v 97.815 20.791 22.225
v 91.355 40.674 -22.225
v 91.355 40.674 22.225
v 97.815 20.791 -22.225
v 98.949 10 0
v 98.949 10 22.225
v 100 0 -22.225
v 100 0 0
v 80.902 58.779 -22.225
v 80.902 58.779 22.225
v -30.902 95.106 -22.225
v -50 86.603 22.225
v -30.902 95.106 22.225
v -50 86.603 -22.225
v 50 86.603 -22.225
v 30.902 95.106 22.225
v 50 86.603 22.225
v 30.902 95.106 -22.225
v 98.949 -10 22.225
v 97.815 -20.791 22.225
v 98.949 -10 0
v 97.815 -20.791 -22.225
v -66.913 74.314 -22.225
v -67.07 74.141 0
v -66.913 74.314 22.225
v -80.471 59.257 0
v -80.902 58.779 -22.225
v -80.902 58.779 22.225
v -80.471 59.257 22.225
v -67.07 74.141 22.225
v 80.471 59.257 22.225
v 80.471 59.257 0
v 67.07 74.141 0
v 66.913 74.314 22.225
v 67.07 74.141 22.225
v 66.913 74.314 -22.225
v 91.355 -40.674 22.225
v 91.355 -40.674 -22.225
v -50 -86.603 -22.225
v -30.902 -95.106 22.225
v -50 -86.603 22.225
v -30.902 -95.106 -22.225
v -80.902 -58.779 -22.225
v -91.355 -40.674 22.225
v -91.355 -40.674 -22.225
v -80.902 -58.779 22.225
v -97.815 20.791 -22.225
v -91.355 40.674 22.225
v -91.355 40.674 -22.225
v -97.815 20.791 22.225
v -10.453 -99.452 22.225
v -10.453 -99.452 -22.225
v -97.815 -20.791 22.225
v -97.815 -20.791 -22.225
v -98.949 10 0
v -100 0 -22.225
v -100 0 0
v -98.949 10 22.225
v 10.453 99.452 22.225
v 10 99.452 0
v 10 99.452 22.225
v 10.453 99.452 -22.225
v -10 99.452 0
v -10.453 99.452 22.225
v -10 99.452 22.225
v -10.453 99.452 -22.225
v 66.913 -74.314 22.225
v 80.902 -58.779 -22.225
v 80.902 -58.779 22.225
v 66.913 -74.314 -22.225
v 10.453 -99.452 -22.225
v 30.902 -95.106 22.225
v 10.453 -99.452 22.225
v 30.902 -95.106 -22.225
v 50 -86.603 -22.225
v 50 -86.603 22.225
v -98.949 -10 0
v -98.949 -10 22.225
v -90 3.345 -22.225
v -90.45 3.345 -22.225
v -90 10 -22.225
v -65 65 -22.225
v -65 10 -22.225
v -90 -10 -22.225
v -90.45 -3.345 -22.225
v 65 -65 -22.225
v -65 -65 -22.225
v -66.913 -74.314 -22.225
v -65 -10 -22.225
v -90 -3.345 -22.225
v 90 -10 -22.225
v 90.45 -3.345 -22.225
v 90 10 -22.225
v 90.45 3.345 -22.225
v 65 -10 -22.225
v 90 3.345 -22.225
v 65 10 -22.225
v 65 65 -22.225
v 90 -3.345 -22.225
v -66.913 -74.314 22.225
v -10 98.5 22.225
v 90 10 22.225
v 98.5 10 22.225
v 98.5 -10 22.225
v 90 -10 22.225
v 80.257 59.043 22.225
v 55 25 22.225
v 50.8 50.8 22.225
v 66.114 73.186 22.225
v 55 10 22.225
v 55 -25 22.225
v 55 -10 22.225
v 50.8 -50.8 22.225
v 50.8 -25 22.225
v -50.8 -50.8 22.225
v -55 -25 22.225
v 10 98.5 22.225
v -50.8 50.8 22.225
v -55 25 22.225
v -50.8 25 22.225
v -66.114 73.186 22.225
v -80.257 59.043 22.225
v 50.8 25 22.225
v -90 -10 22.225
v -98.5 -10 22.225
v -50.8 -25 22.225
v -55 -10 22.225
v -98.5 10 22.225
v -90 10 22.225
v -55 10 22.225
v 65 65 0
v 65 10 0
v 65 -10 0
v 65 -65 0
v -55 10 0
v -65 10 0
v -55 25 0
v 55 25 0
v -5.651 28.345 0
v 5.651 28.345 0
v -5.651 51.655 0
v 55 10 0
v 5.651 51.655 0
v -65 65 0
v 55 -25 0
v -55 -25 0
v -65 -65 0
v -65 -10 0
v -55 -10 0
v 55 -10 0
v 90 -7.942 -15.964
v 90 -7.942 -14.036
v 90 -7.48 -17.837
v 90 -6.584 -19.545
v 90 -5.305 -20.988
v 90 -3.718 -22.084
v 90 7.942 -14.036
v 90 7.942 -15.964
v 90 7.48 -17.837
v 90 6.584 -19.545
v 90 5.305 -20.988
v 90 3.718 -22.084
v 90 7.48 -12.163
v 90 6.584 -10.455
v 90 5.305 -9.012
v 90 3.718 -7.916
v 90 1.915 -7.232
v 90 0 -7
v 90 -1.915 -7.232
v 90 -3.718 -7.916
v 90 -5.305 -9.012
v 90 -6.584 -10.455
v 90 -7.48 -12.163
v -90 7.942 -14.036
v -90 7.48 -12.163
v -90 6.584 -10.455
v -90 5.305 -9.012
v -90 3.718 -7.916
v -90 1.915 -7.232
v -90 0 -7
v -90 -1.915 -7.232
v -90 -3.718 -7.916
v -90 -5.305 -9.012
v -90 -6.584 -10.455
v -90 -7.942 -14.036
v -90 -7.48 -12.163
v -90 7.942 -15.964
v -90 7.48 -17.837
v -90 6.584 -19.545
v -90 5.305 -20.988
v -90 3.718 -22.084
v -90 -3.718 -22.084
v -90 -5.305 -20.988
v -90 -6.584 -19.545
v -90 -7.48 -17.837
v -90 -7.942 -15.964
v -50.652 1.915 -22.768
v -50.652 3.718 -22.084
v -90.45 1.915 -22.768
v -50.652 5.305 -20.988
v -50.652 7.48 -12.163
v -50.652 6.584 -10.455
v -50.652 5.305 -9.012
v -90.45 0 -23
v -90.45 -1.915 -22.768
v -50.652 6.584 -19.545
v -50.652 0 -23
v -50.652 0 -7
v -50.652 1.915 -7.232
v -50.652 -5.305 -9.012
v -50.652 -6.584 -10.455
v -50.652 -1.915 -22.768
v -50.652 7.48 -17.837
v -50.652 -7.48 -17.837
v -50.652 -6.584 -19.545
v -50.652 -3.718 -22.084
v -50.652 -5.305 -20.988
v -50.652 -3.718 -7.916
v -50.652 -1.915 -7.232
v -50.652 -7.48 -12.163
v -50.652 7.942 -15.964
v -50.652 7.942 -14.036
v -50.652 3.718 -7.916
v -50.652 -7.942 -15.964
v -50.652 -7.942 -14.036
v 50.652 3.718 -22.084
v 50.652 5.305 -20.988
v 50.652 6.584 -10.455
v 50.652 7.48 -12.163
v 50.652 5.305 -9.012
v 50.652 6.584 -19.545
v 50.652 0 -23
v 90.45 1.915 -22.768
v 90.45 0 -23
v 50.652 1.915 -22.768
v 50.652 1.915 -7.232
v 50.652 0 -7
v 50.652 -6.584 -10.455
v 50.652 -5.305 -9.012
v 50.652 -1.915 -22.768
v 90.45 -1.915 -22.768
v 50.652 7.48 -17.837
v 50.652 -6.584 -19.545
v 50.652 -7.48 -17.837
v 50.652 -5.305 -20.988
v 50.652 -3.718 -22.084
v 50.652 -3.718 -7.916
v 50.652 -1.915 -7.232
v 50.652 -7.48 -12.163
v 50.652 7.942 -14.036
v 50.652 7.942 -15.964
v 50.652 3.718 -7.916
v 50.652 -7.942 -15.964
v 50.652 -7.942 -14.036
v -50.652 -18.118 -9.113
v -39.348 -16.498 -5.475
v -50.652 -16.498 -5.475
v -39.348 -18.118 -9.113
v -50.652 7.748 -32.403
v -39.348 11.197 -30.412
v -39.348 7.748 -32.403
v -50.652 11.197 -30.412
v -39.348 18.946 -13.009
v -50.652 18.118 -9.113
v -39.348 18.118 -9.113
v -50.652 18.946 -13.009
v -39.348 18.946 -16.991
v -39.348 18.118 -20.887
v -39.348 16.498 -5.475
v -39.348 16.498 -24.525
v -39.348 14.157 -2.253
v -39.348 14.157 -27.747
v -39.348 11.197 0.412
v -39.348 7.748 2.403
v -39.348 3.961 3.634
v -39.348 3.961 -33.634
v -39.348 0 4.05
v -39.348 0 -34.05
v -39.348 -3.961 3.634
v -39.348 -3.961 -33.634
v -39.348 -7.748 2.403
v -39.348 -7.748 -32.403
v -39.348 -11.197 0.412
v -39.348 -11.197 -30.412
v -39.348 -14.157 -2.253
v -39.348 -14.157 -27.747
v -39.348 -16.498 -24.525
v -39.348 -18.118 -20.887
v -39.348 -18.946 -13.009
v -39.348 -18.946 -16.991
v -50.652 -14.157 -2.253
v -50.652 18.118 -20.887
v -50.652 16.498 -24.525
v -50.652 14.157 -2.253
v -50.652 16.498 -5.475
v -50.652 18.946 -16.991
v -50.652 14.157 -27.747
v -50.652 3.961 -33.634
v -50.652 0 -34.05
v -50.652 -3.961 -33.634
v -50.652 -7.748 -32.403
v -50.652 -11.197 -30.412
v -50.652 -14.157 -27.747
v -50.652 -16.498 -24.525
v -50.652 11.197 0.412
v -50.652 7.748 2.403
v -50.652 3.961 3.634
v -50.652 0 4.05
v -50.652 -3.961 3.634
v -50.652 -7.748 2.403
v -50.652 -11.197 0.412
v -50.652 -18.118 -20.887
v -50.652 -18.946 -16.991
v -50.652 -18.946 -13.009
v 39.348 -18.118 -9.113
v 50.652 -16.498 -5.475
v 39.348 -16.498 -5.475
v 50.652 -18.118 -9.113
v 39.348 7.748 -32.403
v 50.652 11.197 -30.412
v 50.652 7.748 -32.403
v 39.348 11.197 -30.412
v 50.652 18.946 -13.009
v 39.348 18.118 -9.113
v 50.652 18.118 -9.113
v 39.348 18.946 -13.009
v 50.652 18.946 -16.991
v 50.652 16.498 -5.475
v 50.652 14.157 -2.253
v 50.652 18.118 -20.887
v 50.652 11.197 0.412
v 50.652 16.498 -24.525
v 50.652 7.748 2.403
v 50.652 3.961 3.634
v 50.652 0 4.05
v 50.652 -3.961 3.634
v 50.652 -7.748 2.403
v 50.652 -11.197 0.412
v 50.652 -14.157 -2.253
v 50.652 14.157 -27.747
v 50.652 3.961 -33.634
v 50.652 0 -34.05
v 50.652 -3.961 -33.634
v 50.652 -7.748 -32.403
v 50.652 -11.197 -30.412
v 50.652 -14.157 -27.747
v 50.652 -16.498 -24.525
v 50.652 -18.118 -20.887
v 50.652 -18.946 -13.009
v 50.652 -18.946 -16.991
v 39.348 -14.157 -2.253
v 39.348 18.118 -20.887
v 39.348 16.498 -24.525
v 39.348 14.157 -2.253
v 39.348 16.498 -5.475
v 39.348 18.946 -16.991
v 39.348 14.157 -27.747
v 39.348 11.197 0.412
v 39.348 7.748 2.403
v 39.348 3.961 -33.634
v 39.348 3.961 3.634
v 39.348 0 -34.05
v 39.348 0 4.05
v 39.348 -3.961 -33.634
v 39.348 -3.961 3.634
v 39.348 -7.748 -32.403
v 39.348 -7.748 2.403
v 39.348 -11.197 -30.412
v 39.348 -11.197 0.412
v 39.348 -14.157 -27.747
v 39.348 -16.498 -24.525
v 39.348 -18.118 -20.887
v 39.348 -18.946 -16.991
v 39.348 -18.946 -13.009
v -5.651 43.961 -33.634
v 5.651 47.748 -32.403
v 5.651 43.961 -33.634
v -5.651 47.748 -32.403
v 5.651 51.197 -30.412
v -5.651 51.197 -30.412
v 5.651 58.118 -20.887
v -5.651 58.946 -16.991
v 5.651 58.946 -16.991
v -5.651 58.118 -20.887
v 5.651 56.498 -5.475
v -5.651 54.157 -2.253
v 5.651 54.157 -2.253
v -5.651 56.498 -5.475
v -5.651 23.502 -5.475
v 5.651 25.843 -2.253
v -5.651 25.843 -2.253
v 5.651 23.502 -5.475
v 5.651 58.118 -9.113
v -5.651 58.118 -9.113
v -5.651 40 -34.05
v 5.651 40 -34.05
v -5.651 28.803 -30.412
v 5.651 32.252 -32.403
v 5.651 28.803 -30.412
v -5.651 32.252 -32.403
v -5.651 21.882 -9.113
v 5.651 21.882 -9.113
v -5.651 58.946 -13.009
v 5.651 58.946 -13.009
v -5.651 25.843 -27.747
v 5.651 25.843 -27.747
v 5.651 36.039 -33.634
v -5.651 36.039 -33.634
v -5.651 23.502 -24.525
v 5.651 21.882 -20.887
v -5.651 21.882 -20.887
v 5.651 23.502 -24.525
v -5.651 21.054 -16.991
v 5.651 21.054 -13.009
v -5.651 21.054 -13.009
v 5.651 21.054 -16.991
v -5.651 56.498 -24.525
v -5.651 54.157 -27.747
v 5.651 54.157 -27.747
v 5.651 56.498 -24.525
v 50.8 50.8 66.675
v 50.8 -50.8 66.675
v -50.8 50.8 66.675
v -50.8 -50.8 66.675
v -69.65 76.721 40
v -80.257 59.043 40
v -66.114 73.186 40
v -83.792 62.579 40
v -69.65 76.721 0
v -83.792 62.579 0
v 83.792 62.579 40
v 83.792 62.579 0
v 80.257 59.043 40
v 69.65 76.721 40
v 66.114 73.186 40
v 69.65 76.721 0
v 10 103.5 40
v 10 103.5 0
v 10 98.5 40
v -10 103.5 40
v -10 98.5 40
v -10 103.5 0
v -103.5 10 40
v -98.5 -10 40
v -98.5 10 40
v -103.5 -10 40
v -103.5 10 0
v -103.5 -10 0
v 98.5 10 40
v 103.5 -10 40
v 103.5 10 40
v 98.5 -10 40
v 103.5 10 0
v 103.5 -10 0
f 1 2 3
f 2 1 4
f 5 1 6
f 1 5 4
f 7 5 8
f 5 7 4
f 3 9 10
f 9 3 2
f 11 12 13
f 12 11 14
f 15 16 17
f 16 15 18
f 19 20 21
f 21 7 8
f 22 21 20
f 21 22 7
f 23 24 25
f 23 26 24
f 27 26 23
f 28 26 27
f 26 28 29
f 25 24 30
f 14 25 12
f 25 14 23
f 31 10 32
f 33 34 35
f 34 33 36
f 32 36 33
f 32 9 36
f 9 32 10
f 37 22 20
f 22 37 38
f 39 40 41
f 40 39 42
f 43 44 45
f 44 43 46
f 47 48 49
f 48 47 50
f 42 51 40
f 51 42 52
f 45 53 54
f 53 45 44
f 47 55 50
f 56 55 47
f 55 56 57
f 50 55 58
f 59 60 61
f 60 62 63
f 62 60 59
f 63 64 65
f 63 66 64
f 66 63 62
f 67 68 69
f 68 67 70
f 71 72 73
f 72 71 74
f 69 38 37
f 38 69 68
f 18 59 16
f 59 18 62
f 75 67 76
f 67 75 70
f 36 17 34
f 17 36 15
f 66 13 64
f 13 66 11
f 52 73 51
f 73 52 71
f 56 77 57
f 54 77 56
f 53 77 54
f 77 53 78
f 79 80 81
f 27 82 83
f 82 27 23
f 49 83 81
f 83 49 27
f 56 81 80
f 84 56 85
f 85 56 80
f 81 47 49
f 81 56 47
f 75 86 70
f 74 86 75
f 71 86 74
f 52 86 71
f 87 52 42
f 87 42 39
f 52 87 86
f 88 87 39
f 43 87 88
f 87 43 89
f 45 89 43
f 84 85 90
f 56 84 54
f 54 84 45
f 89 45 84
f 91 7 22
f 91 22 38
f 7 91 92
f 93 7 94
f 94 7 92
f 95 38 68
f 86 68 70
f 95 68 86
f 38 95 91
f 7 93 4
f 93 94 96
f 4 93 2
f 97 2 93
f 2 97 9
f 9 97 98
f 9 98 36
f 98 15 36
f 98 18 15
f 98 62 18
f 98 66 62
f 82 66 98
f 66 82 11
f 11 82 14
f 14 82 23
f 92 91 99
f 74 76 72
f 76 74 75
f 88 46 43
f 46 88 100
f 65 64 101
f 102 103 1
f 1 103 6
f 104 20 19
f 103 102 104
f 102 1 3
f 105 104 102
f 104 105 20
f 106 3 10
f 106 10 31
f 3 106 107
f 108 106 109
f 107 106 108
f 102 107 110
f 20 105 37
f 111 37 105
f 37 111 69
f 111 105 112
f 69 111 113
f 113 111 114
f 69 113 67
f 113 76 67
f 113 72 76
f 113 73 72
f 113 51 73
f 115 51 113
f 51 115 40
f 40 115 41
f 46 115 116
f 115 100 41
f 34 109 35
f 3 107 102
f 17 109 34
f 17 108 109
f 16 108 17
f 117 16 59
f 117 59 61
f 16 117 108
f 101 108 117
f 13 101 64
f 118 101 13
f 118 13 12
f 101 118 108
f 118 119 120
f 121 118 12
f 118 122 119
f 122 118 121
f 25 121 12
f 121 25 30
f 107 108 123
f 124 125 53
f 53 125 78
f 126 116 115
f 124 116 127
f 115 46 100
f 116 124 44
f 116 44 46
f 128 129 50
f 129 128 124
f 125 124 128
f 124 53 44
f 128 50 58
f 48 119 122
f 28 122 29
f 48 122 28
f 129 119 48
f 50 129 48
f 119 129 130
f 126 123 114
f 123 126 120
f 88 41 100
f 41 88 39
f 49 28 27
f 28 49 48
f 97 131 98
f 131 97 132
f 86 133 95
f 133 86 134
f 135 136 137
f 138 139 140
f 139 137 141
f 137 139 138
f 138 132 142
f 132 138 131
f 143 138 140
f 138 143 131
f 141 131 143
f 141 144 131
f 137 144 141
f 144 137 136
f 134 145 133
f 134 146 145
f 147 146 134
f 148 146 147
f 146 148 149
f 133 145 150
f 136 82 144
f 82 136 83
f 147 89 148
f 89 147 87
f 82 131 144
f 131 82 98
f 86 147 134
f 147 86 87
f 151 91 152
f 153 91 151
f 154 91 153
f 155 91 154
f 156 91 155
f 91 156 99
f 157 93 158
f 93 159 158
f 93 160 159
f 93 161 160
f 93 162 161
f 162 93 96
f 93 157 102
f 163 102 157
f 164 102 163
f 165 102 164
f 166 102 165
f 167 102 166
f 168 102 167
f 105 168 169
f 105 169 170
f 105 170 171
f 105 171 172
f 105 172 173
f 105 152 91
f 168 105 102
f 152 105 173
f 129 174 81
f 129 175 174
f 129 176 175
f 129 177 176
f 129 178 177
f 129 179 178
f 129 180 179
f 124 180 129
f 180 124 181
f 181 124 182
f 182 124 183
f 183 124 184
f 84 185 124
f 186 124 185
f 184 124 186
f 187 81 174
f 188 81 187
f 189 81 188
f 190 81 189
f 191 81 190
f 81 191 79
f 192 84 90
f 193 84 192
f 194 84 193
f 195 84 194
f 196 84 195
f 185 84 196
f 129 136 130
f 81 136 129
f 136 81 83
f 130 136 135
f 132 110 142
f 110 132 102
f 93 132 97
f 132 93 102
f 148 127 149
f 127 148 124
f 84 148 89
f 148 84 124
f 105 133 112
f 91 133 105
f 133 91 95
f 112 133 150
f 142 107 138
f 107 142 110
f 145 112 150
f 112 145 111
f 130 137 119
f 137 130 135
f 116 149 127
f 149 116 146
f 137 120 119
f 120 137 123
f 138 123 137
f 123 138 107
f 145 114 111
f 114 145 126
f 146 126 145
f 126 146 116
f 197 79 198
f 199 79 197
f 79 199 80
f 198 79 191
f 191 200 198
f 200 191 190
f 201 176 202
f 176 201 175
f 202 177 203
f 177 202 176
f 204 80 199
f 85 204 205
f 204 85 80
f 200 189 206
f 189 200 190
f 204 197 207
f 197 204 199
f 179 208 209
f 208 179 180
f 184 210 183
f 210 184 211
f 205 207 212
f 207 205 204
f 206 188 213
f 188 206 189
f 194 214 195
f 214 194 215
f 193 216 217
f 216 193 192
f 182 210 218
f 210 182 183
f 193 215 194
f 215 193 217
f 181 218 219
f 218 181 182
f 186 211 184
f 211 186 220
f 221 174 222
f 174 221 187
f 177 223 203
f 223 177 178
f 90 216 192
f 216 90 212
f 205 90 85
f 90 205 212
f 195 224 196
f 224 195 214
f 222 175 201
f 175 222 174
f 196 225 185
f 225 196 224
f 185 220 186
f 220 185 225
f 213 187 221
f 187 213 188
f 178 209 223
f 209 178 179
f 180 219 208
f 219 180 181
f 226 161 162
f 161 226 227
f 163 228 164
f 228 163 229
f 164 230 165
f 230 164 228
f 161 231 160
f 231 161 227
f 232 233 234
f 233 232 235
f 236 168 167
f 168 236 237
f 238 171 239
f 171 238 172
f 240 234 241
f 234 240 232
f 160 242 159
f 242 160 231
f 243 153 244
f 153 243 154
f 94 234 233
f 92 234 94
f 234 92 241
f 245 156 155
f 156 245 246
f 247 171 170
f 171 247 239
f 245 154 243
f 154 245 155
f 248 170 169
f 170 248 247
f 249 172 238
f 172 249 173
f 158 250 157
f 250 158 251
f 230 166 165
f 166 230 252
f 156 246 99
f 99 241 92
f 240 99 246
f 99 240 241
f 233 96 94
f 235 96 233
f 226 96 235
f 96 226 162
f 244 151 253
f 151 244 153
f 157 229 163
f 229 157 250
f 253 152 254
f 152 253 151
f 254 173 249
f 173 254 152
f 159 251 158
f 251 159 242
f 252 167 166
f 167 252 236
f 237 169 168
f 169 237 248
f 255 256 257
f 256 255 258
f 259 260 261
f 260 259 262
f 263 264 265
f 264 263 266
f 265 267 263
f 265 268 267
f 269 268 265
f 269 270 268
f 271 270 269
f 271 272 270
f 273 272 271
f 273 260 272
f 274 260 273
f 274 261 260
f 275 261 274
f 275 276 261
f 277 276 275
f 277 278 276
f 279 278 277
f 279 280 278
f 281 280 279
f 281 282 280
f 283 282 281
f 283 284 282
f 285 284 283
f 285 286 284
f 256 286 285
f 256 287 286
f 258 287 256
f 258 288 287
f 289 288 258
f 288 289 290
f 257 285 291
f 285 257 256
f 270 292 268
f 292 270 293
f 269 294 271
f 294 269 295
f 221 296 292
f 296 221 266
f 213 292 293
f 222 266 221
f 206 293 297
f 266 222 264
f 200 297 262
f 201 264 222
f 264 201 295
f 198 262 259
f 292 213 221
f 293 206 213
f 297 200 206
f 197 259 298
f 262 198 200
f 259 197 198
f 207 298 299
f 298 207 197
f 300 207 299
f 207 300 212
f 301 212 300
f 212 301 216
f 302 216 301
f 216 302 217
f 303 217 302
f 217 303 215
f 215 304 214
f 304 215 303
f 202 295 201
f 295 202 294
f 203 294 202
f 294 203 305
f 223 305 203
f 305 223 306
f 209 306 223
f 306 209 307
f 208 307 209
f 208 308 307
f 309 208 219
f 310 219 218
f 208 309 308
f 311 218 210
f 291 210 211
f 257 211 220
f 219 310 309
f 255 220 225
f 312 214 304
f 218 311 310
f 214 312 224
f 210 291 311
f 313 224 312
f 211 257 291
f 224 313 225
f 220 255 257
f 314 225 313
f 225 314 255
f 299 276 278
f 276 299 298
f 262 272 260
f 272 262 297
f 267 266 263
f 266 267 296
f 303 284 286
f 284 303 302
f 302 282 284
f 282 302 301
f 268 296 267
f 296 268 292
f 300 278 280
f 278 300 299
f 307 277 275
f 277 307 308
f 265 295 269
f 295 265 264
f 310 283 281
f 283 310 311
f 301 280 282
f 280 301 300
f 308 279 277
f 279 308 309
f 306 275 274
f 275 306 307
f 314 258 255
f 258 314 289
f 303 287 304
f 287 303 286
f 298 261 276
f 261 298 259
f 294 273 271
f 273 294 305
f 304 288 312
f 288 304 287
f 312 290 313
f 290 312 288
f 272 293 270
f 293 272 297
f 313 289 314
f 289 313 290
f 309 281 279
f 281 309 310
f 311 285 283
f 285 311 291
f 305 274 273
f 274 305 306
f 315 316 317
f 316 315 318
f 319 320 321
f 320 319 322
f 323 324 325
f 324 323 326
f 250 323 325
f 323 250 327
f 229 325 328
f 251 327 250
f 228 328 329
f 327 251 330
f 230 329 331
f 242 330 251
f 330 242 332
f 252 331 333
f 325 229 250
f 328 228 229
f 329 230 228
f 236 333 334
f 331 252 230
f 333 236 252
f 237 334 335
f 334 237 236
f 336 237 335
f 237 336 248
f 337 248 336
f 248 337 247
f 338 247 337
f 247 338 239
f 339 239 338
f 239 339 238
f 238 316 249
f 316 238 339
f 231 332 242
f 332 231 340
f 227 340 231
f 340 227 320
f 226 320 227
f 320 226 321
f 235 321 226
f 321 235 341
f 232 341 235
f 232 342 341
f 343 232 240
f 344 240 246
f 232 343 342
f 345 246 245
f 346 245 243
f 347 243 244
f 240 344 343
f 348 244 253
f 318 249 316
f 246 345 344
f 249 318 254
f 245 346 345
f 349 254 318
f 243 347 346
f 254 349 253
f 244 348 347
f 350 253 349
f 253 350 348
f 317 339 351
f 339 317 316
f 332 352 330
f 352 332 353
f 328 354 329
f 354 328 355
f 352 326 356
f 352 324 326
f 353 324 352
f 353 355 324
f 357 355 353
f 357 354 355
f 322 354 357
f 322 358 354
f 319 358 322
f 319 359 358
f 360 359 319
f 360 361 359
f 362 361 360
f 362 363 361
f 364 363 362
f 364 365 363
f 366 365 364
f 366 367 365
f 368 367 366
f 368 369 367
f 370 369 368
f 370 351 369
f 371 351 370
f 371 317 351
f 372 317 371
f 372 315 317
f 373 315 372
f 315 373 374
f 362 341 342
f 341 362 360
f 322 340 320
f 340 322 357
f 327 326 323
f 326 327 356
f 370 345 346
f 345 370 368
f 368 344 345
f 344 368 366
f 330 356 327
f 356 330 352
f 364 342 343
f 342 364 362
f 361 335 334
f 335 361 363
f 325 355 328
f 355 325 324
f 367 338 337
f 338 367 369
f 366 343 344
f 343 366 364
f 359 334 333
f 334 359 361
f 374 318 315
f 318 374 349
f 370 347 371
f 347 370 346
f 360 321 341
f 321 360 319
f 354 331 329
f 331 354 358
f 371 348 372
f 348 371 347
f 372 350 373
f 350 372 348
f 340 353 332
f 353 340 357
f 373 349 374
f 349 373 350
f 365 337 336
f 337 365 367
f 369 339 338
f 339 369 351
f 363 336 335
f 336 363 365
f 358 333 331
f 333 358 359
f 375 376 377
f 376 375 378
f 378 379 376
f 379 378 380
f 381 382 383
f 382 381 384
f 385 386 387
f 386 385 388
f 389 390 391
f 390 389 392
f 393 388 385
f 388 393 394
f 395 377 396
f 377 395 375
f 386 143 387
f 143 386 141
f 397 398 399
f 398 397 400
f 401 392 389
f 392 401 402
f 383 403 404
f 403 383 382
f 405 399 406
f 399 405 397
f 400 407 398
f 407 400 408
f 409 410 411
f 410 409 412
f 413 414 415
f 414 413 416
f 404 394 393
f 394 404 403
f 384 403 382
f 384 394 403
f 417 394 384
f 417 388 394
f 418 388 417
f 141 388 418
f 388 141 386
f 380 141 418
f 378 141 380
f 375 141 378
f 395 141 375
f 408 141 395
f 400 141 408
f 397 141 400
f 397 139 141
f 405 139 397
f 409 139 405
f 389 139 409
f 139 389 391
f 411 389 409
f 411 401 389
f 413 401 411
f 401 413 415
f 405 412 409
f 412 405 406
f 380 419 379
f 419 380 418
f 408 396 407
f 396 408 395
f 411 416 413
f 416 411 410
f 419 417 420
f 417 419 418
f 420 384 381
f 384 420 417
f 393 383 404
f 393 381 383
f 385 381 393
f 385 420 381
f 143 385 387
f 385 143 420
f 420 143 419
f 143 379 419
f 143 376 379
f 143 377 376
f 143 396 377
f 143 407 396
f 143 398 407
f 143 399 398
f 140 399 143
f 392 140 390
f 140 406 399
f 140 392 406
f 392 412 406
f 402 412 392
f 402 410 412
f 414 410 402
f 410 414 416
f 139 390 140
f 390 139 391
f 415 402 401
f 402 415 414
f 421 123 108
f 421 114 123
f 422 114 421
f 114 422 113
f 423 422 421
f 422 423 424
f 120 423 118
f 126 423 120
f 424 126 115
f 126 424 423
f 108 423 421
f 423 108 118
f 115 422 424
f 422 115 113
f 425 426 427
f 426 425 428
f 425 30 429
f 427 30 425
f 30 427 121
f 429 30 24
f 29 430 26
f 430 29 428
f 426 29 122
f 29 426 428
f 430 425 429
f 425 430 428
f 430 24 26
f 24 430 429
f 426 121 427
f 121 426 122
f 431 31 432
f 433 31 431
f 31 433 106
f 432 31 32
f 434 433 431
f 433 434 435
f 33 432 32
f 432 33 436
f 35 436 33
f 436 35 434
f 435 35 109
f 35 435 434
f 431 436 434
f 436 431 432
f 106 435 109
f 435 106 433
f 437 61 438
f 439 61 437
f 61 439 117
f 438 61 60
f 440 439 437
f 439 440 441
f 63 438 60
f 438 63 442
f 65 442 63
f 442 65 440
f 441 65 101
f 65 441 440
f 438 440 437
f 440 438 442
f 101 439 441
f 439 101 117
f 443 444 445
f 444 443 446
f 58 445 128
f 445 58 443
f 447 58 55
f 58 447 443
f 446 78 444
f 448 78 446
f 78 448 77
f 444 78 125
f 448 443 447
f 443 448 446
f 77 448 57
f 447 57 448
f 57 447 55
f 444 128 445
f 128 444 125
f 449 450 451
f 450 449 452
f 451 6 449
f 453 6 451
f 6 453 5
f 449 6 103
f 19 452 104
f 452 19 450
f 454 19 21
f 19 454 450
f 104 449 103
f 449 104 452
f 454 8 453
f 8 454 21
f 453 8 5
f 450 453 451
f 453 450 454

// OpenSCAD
//main body
difference(){
    
    cylinder(44.45,100,100,true);
    // square hole in middle
    translate([0,0,-22.225])
        cube([130,130,44.45], true);
    //square extension
    cube([180,20,45], true);
    //another hole in the middle
    cube([110,50,45], true);
    /*hole 1 in corner
    translate([-38, -38, 0])
        cylinder(500, 12, 12, true);
    //hole 2 in corner
    translate([-38, 38, 0])
        cylinder(500, 12, 12, true);
    //hole 3 in corner
    translate([38, -38, 0])
        cylinder(500, 12, 12, true);
    //hole 4 in corner
    translate([38, 38, 0])
        cylinder(500, 12, 12, true);*/
}
//main motor left
rotate([0,90,0])
    translate([15, 0, -70])
cylinder(40.9, 8, 8, true);
//main motor right
rotate([0,90,0])
    translate([15, 0, 70])
cylinder(40.9, 8, 8, true);
/*motor turnything left
rotate([90,0,0])
    translate([0,-75, -185]) 
    cylinder(40, 10, 10, $fn=6, true);
//motor turnything right
rotate([90,0,0])
    translate([0,-75, 185]) 
    cylinder(40, 10, 10, $fn=6, true);*/
//wheel left
rotate([0, 90, 0])
    translate([15, 0, -45])
    cylinder(11.303, 19.05, 19.05, true);
//wheel left
rotate([0, 90, 0])
    translate([15, 0, 45])
    cylinder(11.303, 19.05, 19.05, true);
//caster
rotate([0, 90, 0])
    translate([15, 40, 0])
    cylinder(11.303, 19.05, 19.05, true);
//controller
    translate([0,0,44.45])
        cube([101.6,101.6,44.45], true);
//ir sensor FL
rotate([0,0,45])
translate([-5, 101, 20])
    cube([20, 5, 40], true);
//ir sensor FR
rotate([0,0,-45])
translate([5, 101, 20])
    cube([20, 5, 40], true);
//ir sensor F
translate([0, 101, 20])
    cube([20, 5, 40], true);
//ir sensor L
rotate([0, 0, 90])
    translate([0, 101, 20])
        cube([20, 5, 40], true);
//ir sensor R
rotate([0, 0, 90])
    translate([0, -101, 20])
        cube([20, 5, 40], true);
